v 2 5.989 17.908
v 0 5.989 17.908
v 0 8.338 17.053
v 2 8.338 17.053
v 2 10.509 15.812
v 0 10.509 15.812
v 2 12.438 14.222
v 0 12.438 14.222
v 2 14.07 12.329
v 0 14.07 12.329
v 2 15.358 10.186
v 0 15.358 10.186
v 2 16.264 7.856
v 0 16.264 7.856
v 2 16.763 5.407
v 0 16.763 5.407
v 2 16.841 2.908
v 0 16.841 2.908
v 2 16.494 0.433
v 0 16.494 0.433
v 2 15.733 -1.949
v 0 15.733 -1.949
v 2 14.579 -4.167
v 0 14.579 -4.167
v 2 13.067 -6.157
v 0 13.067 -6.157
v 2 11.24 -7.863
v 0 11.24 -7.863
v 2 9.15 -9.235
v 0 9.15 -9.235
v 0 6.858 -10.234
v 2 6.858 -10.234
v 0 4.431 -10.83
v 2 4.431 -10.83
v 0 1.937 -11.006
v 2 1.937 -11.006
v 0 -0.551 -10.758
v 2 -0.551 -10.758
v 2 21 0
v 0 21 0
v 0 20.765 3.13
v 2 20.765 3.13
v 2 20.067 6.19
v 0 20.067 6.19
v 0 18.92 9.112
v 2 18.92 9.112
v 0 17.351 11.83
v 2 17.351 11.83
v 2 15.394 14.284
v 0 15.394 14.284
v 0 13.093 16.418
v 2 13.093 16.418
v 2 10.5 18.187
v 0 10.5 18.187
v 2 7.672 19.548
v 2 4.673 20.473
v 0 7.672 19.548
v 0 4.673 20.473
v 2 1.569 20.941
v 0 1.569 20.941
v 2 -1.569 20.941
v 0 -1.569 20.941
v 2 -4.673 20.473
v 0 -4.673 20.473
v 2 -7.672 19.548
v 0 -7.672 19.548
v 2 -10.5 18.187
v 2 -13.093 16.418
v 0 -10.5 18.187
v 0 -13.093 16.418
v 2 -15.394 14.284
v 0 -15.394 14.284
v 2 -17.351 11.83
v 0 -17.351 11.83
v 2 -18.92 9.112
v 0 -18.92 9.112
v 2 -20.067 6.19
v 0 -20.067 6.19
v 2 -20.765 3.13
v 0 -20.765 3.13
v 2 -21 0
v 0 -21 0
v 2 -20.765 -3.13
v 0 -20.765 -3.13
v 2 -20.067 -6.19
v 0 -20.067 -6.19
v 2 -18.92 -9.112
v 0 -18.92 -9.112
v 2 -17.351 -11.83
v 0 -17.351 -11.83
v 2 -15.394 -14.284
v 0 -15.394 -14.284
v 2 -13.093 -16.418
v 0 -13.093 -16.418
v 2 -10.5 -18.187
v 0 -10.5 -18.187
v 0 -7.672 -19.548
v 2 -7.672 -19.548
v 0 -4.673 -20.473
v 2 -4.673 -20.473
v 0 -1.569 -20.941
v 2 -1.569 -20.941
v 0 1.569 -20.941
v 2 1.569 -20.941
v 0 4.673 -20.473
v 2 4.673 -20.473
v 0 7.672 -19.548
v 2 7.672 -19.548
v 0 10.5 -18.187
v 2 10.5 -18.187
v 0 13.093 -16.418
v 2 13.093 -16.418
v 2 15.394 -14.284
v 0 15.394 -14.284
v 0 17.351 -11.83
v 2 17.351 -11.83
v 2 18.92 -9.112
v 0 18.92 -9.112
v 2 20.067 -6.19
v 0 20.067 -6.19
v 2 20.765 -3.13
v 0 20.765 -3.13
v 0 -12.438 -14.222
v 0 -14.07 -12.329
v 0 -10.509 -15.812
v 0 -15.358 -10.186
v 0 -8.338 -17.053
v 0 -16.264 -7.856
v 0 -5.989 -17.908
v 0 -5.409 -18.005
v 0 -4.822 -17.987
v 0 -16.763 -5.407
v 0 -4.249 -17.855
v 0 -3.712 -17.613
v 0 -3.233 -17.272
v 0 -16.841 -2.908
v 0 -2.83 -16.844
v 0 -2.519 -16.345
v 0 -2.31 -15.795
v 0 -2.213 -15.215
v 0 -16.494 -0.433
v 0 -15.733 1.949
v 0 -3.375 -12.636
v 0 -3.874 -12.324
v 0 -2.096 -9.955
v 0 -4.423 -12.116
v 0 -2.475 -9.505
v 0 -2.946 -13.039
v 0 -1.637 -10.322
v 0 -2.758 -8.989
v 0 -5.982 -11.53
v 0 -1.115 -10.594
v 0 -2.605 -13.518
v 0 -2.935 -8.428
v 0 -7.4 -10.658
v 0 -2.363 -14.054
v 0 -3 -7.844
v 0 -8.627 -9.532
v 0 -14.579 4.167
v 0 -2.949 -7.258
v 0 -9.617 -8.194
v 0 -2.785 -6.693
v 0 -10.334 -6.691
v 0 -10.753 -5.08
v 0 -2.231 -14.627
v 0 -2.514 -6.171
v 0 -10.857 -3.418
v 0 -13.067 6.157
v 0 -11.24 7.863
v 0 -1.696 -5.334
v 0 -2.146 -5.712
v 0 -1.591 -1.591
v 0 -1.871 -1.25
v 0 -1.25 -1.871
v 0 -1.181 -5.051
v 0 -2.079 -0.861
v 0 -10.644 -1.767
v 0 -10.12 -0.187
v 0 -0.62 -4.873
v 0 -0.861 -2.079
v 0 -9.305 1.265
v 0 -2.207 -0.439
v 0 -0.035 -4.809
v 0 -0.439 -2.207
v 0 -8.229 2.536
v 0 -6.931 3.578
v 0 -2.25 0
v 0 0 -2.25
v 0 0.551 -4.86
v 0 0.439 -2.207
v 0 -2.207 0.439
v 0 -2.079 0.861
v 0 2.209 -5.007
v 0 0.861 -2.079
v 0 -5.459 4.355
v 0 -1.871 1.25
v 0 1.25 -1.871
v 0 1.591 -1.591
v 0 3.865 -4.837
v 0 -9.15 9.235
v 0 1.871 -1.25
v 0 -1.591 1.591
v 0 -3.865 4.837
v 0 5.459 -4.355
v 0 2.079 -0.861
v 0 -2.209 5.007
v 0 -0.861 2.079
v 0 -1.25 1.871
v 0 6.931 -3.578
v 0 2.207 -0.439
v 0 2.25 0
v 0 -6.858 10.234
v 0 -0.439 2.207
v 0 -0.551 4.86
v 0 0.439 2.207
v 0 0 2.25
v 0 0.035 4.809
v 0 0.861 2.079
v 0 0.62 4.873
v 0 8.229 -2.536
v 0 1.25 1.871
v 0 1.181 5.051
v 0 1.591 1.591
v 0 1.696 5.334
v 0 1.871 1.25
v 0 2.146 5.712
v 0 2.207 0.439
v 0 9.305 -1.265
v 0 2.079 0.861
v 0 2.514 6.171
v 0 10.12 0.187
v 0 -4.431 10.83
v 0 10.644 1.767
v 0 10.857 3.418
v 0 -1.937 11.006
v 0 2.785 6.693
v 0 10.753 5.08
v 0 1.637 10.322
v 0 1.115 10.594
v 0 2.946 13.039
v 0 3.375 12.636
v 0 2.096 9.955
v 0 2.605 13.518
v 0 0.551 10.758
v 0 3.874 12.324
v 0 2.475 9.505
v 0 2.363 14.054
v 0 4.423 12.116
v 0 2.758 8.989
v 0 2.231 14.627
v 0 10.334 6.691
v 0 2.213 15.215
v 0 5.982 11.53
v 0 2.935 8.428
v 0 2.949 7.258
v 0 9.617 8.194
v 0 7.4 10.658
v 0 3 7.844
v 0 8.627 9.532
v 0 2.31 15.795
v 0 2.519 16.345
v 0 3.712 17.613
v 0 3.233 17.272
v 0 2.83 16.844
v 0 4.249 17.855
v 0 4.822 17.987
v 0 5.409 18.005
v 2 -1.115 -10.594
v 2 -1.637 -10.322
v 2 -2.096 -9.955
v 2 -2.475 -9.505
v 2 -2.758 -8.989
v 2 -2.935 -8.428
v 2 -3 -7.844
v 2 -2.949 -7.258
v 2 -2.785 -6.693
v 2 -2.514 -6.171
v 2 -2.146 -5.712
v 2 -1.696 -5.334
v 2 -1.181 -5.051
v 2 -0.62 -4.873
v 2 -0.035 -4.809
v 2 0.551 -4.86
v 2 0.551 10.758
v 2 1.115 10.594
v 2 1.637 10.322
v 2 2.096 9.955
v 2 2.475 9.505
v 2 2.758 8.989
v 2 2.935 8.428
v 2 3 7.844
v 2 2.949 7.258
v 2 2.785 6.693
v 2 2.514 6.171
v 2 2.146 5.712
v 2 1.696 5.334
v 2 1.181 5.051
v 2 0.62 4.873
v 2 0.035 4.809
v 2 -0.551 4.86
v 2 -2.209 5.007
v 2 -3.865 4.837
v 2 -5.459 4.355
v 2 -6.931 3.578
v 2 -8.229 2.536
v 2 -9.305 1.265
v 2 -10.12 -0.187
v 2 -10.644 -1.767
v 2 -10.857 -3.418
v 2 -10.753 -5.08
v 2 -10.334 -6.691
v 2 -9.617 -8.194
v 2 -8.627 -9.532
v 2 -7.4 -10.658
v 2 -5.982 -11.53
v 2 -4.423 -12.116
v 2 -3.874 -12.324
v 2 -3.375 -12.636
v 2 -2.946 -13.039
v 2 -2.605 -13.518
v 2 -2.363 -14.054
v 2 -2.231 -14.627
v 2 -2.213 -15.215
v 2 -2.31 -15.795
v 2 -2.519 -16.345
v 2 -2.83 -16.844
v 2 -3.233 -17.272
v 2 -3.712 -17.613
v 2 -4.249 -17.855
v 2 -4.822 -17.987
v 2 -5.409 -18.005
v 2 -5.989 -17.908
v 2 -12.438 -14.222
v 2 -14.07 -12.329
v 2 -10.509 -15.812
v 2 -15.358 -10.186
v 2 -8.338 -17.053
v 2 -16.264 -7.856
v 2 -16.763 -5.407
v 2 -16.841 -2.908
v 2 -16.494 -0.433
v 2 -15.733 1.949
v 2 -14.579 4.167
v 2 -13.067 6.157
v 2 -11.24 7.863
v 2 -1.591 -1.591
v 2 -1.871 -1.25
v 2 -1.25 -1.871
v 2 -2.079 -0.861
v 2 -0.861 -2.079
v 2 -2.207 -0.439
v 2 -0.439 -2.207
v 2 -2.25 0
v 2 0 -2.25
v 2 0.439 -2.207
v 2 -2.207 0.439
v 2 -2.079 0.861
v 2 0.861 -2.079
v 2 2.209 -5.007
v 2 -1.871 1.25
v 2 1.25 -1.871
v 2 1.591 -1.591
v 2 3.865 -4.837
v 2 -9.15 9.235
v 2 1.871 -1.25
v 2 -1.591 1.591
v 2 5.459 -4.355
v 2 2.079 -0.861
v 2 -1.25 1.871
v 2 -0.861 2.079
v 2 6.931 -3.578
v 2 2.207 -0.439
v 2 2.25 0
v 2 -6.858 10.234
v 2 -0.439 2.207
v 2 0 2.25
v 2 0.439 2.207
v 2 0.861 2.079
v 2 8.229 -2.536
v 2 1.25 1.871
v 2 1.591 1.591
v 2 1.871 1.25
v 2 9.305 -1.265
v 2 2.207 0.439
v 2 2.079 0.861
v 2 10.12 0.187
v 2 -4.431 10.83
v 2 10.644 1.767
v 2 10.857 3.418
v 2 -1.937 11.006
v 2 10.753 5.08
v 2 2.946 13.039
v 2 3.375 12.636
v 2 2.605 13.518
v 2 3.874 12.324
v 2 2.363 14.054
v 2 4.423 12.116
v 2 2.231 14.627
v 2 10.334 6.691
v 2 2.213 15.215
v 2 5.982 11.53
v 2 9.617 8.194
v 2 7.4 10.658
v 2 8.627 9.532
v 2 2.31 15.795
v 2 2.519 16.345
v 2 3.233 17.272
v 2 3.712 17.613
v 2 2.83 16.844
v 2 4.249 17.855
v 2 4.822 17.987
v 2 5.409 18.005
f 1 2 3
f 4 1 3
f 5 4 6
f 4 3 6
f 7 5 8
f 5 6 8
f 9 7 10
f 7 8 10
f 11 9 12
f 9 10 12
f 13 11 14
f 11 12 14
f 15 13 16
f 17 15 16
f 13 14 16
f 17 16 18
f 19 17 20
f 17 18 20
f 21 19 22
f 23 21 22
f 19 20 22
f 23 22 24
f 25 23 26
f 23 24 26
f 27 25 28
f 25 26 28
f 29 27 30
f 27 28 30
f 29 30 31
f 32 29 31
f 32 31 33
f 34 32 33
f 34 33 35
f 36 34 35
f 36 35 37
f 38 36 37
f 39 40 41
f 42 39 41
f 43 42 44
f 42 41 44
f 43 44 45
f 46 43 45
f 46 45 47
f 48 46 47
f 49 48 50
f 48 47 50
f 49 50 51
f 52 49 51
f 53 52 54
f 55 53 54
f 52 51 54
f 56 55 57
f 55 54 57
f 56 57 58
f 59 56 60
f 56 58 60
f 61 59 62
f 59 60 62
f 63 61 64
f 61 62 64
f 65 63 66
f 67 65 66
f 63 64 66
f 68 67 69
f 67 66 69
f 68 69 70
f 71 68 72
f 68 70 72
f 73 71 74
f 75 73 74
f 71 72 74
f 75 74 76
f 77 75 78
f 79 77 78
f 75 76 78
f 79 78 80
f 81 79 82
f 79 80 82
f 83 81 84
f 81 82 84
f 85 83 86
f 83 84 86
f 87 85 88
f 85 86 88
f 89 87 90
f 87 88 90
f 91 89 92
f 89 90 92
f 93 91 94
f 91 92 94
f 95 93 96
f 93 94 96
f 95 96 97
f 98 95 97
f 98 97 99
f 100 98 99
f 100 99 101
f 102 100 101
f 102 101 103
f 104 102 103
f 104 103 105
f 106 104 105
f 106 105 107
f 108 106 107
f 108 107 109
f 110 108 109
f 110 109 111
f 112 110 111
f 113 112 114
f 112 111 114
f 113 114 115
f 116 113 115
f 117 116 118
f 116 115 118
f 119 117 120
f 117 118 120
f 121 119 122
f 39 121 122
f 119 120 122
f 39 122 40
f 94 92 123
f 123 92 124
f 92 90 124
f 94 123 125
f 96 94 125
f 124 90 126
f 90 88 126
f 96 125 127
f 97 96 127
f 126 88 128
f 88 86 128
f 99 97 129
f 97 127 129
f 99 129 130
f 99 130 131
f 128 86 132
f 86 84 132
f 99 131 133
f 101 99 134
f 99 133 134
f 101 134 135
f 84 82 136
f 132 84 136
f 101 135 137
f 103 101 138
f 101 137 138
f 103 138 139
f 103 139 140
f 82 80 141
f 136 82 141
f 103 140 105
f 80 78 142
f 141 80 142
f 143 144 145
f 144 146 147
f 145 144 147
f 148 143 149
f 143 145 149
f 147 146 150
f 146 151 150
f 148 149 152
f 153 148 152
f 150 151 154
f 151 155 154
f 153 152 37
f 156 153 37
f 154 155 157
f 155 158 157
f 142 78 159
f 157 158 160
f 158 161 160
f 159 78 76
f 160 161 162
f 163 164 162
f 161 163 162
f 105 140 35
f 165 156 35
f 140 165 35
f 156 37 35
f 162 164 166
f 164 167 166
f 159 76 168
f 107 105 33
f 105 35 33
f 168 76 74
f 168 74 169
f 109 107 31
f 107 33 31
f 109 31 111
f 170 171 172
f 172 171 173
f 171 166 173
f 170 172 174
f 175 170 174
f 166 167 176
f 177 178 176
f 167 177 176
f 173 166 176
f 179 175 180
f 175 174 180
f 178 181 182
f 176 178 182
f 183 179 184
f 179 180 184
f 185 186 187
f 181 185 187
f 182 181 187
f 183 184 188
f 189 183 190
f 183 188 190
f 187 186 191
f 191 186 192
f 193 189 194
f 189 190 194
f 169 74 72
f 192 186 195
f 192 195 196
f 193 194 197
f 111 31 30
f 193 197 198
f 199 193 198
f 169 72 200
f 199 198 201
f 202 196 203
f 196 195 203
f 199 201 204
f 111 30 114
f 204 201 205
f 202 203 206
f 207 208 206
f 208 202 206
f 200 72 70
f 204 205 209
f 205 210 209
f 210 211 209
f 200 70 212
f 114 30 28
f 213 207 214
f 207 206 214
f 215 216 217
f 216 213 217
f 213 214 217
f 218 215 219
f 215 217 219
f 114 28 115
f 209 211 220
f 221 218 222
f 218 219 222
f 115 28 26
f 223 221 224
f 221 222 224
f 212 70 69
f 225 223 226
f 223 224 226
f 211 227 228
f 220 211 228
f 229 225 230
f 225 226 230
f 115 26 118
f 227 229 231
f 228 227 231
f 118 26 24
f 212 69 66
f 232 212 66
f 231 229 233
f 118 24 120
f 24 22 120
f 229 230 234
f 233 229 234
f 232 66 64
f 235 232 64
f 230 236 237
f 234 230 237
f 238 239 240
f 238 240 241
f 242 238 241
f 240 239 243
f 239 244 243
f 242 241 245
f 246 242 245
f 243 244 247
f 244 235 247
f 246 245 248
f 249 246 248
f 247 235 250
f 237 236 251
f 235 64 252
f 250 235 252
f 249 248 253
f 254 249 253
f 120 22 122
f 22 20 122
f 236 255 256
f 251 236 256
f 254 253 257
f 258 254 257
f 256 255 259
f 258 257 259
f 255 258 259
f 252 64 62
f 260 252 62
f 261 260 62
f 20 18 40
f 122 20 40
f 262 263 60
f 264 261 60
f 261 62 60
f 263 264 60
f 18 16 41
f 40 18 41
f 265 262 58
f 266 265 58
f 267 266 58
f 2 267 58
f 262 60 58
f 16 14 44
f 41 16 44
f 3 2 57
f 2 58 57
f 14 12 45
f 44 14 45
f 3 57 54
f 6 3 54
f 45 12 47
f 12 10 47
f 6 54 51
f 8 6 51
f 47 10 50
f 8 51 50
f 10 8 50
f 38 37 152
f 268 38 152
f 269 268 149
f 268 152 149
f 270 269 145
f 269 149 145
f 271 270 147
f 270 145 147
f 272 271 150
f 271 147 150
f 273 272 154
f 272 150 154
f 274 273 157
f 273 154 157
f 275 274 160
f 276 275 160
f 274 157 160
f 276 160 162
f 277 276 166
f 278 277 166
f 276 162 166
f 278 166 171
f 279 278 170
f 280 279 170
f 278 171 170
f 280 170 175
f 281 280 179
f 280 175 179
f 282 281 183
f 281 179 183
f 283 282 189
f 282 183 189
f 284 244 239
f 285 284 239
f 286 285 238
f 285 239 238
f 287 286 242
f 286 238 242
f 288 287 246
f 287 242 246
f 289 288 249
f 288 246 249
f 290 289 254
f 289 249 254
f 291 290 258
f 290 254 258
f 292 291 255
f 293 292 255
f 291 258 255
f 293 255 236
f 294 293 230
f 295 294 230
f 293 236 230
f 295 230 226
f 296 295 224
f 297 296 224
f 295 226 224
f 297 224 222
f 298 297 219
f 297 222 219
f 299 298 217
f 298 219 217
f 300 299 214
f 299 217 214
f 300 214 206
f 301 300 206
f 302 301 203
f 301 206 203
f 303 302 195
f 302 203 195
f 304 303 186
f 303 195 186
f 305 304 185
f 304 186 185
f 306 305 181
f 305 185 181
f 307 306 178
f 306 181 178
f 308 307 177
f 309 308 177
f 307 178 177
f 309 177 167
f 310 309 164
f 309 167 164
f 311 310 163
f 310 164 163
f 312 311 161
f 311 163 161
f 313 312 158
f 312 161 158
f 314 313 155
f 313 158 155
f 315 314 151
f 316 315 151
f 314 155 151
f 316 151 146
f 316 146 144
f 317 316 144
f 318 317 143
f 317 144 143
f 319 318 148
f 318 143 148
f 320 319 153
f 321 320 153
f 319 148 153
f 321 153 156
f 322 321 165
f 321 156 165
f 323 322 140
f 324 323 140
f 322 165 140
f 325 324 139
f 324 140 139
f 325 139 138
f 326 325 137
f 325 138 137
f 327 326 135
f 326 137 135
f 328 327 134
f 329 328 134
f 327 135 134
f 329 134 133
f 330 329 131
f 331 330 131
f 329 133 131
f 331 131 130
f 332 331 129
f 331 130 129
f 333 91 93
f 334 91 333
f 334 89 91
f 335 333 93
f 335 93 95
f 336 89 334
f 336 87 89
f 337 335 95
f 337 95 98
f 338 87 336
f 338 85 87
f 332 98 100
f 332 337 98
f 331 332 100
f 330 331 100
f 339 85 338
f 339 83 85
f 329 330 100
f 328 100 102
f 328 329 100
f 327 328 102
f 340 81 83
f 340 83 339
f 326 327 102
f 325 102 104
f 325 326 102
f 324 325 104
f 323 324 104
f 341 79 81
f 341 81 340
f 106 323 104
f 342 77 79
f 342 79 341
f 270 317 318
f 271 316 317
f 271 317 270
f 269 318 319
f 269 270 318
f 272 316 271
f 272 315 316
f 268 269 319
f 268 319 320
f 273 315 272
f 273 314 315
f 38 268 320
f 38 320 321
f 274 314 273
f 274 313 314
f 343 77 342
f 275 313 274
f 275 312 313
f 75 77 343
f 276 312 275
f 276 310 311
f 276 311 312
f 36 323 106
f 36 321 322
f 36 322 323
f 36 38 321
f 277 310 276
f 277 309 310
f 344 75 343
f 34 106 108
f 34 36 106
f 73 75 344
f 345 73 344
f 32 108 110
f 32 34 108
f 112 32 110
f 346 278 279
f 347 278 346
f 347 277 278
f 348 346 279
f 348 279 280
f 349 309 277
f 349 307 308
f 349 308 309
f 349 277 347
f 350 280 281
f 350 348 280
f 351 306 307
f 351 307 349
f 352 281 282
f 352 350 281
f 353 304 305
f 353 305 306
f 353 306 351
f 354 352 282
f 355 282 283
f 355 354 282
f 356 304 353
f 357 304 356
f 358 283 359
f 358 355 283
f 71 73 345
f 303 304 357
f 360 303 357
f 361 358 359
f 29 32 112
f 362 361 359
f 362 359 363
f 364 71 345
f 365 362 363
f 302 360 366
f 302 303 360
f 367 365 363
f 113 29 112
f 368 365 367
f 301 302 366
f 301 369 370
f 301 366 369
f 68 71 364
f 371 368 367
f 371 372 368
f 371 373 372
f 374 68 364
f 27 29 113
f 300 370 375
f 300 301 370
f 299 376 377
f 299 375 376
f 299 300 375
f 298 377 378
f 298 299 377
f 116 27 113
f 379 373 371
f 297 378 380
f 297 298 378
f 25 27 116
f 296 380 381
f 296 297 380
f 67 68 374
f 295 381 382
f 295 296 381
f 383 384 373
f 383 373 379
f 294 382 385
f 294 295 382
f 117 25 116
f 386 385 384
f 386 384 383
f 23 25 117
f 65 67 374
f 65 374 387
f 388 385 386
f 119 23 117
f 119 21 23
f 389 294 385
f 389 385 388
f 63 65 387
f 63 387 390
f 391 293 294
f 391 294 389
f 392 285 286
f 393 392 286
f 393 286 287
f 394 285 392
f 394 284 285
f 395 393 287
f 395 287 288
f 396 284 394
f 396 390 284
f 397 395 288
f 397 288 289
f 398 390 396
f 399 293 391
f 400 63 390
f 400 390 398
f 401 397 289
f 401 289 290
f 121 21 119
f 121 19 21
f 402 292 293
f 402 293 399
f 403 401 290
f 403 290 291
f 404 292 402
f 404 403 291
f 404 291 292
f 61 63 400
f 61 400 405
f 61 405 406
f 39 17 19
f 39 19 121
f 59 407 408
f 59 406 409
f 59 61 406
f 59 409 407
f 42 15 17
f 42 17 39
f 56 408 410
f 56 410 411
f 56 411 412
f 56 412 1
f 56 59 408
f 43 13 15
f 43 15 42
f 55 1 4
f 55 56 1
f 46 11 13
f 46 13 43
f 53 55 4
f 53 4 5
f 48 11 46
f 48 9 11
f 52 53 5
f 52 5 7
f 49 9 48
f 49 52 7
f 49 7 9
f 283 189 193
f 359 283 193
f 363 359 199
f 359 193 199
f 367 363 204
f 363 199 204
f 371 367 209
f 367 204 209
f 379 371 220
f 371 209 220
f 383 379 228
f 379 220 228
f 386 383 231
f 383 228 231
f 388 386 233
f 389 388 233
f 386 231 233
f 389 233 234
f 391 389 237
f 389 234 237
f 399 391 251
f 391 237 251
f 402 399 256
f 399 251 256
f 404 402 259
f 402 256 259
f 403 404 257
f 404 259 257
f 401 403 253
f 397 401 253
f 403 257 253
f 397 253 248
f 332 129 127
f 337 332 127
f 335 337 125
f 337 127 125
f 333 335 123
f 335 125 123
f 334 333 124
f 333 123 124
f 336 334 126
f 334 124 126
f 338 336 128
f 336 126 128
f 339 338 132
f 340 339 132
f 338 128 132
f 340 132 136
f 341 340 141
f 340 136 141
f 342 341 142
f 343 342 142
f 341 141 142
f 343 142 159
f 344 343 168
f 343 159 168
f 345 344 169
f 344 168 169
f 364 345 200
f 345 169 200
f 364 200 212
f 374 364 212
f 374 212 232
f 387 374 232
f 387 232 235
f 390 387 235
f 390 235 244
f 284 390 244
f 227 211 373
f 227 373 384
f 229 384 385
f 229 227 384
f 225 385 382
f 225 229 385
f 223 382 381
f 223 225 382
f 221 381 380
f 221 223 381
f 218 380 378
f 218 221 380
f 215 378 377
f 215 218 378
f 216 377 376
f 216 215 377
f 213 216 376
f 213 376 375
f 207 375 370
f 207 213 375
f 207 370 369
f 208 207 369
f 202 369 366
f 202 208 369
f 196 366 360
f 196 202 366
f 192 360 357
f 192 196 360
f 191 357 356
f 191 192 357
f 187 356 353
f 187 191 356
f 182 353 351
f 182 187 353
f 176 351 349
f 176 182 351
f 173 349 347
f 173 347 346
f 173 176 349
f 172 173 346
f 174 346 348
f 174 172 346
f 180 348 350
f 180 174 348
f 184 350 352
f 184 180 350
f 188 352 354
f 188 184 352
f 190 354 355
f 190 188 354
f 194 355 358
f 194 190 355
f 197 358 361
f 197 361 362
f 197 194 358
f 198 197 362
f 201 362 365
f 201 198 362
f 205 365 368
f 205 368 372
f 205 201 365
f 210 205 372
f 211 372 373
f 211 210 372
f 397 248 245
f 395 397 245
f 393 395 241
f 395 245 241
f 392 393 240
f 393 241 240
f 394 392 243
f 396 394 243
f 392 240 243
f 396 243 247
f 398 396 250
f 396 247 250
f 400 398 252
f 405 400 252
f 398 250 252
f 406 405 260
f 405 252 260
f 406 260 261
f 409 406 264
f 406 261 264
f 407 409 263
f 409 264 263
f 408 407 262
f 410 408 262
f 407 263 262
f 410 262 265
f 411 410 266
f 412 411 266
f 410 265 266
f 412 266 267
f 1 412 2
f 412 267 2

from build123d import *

# Parameters (mm, degrees)
F0_R     = 21
F0_R_2   = 2.25
F1_DEPTH = 2


with BuildPart() as f1:
    # F0 (on Right) → F1 (new body)
    with BuildSketch(Plane.YZ):
        Circle(F0_R)
        with BuildLine():
            ThreePointArc((-4.423462, -12.115904), (-2.310416, -15.794904), (-5.989415, -17.90795))
            ThreePointArc((-5.989415, -17.90795), (-16.493635, -0.432608), (0.55056, 10.757637))
            ThreePointArc((0.55056, 10.757637), (2.949048, 7.258029), (-0.55056, 4.859542))
            ThreePointArc((-0.55056, 4.859542), (-10.643946, -1.767199), (-4.423462, -12.115904))
        make_face(mode=Mode.SUBTRACT)
        Circle(F0_R_2, mode=Mode.SUBTRACT)
        with BuildLine():
            ThreePointArc((-0.55056, -10.757637), (-2.949048, -7.258029), (0.55056, -4.859542))
            ThreePointArc((0.55056, -4.859542), (10.643946, 1.767199), (4.423462, 12.115904))
            ThreePointArc((4.423462, 12.115904), (2.310416, 15.794904), (5.989415, 17.90795))
            ThreePointArc((5.989415, 17.90795), (16.493635, 0.432608), (-0.55056, -10.757637))
        make_face(mode=Mode.SUBTRACT)
    extrude(amount=F1_DEPTH)


solid = f1.part
